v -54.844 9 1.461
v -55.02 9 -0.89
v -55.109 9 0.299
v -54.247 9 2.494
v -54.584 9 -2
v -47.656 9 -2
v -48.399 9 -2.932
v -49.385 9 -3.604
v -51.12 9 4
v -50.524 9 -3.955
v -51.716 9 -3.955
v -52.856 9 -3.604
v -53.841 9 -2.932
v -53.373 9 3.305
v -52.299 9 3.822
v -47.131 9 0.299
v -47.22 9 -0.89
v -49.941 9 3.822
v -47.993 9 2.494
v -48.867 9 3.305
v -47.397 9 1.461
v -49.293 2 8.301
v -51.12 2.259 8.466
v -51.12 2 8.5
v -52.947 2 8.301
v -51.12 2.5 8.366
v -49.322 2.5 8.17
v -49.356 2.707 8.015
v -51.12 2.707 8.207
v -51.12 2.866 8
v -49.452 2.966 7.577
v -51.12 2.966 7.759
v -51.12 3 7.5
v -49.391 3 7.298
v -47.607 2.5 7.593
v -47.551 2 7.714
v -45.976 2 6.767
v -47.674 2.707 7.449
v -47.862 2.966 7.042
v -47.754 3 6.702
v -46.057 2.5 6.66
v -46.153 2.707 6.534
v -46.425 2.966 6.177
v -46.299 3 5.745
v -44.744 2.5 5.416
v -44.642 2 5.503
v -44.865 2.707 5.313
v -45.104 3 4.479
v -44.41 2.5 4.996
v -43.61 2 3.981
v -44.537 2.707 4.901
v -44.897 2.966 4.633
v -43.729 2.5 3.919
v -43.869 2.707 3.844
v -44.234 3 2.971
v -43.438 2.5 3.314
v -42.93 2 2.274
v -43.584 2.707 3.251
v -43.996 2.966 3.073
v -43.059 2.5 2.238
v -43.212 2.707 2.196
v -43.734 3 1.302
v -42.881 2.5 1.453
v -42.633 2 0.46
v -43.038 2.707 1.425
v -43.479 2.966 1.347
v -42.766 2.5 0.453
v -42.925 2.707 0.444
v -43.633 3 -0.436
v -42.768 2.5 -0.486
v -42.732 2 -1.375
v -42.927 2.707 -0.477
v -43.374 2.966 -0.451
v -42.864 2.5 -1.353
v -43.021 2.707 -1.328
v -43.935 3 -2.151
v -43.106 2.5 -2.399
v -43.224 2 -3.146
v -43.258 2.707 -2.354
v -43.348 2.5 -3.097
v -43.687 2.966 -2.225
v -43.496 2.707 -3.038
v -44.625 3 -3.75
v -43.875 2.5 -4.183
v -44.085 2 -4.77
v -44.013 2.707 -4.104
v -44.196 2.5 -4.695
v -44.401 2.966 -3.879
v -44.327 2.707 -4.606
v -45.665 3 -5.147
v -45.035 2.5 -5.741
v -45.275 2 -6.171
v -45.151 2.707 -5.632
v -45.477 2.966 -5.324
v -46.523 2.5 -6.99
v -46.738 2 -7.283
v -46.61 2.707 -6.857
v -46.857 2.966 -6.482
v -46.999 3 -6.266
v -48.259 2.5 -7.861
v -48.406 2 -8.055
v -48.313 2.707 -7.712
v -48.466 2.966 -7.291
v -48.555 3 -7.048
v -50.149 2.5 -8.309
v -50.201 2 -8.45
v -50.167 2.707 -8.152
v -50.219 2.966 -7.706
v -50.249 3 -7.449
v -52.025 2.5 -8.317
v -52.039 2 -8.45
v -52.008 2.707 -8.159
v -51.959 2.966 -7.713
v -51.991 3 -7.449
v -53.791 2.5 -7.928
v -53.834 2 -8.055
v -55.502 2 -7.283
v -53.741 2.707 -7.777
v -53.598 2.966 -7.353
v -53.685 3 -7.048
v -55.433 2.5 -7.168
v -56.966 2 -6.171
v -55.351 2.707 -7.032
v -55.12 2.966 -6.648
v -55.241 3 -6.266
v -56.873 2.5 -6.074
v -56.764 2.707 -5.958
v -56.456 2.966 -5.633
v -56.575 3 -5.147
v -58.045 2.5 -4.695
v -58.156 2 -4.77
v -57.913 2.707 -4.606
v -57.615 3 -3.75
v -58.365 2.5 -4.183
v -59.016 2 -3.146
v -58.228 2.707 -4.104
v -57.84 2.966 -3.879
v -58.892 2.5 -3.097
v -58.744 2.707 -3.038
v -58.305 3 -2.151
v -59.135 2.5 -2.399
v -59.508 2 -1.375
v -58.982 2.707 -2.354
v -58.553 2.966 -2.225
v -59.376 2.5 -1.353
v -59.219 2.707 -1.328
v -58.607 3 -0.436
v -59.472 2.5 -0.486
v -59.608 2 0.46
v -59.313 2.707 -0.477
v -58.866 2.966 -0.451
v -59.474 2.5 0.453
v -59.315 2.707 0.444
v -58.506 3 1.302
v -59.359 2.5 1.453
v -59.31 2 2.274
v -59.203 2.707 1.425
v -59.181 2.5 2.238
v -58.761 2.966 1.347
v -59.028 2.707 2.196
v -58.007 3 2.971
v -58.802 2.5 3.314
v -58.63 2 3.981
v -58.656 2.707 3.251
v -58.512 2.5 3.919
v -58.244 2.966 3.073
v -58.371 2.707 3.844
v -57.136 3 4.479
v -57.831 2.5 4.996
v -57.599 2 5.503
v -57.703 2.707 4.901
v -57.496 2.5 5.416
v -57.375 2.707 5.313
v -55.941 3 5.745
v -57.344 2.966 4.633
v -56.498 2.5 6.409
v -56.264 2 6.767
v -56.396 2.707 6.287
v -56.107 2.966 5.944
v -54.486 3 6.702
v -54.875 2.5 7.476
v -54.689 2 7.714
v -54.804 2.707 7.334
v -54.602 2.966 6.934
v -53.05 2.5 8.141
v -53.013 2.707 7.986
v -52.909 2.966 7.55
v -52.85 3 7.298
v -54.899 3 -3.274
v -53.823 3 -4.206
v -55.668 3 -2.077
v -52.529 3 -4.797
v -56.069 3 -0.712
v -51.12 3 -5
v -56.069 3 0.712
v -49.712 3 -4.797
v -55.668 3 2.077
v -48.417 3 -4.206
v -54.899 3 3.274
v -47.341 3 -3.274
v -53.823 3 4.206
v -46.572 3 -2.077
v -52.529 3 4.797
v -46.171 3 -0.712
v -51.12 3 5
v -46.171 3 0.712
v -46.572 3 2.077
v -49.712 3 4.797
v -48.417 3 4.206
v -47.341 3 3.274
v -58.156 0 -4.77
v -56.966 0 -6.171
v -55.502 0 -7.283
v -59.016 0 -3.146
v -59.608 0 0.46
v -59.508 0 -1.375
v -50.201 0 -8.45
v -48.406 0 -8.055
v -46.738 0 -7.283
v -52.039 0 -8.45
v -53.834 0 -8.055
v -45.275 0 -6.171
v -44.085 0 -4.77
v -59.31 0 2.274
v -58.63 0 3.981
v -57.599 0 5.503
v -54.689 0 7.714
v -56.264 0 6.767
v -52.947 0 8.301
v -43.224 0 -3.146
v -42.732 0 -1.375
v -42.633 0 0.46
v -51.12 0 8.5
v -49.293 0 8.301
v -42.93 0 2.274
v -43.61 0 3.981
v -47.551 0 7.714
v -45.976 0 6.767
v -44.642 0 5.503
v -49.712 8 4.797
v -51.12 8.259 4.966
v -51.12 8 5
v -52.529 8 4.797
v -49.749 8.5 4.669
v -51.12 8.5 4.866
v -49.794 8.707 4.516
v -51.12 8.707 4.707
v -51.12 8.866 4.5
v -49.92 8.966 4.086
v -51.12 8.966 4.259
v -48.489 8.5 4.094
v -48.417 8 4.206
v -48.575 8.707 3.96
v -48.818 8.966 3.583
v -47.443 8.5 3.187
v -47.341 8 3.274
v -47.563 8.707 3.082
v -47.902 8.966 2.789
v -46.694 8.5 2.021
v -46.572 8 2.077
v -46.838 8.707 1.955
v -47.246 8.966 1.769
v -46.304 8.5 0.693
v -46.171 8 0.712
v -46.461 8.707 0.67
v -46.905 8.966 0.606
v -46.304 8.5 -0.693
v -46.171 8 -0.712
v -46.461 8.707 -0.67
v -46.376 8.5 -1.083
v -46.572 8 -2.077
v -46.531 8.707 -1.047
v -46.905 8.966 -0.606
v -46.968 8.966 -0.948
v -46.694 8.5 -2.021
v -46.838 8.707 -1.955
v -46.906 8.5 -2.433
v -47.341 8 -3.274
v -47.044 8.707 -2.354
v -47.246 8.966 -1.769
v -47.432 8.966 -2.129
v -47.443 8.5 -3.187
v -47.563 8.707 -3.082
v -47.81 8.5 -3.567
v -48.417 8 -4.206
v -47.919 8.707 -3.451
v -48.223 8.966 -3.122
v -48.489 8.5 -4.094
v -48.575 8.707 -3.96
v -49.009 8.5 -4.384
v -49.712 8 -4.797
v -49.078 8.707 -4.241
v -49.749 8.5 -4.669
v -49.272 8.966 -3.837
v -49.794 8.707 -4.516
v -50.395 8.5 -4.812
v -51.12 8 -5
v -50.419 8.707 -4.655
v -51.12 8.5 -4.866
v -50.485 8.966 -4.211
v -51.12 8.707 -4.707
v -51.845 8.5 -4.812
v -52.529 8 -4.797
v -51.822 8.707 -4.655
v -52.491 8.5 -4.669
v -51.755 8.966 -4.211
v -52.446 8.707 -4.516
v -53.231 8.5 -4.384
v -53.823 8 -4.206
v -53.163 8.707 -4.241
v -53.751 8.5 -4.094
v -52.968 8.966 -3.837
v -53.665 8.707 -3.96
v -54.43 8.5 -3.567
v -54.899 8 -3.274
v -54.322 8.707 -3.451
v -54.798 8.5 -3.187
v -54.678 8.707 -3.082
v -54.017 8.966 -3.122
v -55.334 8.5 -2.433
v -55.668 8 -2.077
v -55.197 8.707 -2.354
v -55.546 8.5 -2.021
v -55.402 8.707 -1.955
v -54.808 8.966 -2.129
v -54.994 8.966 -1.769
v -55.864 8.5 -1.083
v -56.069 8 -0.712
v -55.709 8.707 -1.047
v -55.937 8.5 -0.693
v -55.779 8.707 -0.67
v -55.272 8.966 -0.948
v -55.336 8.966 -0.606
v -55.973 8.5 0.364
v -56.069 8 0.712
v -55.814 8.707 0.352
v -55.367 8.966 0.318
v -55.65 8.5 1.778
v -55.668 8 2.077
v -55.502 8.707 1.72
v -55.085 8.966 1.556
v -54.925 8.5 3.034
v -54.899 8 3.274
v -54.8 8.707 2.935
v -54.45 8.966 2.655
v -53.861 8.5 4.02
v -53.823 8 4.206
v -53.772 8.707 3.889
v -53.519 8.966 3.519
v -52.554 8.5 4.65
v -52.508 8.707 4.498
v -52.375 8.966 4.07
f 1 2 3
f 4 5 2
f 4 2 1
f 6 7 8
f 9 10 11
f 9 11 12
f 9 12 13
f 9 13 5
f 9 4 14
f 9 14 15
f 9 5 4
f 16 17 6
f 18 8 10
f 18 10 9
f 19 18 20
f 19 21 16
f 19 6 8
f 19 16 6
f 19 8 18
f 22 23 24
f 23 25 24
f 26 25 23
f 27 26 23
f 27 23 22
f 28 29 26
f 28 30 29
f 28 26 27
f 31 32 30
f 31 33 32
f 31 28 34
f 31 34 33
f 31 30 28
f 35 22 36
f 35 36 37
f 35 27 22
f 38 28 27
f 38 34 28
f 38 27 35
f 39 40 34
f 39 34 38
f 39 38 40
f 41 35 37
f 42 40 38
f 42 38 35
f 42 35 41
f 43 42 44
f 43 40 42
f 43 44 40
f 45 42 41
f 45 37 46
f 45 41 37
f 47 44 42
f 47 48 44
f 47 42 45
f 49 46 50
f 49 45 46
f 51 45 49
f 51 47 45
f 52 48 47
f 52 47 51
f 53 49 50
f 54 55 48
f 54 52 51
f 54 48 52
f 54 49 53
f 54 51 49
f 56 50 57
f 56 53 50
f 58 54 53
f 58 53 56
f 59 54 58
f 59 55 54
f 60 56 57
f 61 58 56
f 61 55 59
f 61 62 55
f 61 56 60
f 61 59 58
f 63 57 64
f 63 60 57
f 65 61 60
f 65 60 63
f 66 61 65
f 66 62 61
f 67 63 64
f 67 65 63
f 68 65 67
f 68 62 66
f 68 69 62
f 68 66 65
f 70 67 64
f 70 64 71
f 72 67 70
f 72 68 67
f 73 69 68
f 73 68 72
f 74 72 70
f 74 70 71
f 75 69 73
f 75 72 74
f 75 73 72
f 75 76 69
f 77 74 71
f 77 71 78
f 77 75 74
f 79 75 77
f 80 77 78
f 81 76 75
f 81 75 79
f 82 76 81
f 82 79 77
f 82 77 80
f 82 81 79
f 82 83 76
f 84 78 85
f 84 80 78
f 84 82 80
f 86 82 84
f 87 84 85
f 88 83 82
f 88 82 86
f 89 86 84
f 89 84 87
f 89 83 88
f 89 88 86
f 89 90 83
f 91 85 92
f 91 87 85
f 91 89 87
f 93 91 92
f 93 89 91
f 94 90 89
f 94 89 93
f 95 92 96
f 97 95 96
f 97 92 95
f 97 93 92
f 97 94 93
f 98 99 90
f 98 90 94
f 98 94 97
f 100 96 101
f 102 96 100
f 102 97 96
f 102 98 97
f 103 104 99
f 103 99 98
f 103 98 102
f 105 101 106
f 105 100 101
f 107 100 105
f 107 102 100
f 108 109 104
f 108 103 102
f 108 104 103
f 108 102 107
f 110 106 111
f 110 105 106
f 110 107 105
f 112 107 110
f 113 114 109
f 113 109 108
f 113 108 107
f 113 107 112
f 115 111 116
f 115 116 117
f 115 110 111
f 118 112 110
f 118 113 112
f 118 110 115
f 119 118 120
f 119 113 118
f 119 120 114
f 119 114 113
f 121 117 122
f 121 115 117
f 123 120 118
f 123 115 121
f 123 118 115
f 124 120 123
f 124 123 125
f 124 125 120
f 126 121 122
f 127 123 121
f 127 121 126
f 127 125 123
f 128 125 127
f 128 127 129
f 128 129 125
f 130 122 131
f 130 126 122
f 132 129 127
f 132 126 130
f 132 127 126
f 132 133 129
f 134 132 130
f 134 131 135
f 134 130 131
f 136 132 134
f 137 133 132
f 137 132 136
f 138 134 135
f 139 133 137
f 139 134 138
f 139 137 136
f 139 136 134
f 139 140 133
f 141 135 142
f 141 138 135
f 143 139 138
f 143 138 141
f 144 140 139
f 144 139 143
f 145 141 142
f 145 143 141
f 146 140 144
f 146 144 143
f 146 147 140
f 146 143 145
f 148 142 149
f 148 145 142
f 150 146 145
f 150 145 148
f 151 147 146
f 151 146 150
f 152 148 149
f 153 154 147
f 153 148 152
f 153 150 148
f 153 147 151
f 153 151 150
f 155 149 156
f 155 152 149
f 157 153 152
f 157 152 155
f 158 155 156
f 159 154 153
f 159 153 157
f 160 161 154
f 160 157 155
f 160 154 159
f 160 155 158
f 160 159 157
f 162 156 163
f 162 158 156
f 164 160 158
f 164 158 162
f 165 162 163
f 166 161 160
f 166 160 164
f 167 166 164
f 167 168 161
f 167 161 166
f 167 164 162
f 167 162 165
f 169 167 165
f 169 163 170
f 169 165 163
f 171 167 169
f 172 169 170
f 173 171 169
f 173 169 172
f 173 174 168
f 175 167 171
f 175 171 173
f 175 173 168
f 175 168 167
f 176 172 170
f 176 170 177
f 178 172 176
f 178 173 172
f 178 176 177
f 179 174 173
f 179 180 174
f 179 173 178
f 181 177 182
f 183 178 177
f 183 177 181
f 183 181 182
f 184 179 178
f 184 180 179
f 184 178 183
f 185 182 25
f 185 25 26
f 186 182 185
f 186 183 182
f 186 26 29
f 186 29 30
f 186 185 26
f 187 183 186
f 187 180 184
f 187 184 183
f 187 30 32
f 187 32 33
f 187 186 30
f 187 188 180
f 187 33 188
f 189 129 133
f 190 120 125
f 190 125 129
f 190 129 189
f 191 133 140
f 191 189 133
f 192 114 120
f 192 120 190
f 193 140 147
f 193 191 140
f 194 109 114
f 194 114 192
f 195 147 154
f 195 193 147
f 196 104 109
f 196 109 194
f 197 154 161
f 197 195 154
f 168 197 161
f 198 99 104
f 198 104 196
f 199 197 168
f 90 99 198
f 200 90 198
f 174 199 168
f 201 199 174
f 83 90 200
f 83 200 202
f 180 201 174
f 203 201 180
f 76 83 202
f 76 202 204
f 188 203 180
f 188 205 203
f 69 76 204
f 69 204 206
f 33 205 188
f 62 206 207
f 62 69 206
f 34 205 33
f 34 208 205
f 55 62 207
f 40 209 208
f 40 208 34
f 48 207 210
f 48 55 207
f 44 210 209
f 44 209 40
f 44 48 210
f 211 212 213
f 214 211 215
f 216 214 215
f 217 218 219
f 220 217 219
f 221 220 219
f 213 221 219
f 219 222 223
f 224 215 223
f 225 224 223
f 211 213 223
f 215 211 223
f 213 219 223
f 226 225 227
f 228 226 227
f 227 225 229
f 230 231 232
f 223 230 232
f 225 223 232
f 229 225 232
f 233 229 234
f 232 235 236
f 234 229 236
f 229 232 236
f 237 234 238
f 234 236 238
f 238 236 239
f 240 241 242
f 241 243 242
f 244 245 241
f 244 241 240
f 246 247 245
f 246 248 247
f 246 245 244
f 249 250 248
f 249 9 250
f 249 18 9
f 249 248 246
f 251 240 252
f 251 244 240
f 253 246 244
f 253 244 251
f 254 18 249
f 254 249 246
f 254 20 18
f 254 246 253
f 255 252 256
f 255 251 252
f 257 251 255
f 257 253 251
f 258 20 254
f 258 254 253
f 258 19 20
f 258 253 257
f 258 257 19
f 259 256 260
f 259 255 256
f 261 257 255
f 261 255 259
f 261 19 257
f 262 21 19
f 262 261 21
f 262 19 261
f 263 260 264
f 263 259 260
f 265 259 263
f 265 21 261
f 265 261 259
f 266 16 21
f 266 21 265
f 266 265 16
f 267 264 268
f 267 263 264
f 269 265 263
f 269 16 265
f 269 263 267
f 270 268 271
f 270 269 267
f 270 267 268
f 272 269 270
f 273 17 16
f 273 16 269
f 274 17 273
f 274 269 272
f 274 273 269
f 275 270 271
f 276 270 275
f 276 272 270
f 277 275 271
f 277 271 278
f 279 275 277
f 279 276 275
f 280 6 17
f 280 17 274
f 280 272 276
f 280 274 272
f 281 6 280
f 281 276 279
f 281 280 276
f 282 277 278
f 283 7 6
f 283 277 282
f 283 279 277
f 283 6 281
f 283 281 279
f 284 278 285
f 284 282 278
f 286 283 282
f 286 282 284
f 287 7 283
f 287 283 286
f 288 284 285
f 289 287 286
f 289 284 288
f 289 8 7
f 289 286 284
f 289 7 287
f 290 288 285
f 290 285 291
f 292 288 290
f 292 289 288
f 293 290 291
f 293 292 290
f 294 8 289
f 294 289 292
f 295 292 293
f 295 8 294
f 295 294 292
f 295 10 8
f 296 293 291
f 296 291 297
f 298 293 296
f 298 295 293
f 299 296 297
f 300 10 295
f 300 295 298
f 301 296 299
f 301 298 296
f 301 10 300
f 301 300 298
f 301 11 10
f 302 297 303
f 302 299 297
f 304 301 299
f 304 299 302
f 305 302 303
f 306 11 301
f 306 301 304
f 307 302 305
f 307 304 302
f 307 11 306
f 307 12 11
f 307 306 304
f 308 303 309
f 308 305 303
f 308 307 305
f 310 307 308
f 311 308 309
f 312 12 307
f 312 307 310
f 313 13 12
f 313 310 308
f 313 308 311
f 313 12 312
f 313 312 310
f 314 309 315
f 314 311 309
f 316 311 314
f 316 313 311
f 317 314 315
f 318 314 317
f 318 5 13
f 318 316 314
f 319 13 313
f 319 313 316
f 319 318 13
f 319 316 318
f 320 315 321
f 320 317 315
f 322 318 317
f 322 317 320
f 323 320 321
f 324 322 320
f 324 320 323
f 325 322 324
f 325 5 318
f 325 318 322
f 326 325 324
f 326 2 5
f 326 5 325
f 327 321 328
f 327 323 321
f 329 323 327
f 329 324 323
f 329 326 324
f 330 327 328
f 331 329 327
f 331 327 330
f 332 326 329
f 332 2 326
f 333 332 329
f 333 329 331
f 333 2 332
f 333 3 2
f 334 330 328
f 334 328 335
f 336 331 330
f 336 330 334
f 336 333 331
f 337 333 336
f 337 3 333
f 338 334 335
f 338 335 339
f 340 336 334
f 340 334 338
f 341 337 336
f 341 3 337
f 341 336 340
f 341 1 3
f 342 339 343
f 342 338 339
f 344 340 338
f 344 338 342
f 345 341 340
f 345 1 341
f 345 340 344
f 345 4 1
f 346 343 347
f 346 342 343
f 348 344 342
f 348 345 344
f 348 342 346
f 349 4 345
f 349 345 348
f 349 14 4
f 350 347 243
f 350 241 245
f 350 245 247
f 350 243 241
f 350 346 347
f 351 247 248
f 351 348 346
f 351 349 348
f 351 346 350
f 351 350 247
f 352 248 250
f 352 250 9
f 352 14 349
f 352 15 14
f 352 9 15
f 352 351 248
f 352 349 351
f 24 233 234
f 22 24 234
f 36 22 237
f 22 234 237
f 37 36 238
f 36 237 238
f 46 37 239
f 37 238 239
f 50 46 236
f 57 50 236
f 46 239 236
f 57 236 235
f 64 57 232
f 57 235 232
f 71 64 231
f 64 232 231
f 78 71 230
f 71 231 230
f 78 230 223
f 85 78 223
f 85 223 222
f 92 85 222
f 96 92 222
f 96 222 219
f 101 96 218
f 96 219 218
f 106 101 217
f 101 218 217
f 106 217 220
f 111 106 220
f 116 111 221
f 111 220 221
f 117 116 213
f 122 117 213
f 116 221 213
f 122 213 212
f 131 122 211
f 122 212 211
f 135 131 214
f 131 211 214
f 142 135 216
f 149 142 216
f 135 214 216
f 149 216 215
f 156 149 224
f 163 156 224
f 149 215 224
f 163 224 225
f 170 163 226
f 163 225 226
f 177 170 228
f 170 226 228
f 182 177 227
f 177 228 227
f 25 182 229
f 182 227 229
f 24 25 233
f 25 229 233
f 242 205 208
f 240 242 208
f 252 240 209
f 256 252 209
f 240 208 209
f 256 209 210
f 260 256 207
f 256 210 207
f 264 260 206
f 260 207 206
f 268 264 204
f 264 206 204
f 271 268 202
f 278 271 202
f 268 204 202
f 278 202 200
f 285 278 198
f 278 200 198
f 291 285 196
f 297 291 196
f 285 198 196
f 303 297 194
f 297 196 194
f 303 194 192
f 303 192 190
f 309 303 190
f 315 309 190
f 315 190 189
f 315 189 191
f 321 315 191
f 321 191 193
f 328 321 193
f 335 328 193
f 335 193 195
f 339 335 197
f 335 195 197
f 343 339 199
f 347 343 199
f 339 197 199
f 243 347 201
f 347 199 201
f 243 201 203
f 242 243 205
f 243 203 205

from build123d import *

# Parameters (mm, degrees)
SKETCH1_R           = 8.5
BOSS_EXTRUDE1_DEPTH = 3
FILLET2_R           = 1
SKETCH2_R           = 5
BOSS_EXTRUDE3_DEPTH = 6
FILLET4_R           = 1


with BuildPart() as part:
    # Sketch1 → Boss-Extrude1 (new body)
    with BuildSketch(Plane(origin=(0, 0, 0), x_dir=(1, 0, 0), z_dir=(0, 1, 0))):
        with Locations(Location((-51.120170416, 0, 0), (0, 0, 270))):
            Circle(SKETCH1_R)
    extrude(amount=BOSS_EXTRUDE1_DEPTH)

    # Fillet2
    fillet2_edges = [part.edges().sort_by_distance(p)[0] for p in [
        (-51.120170416, 3, -8.5),
    ]]
    fillet(fillet2_edges, radius=FILLET2_R)

    # Sketch2 → Boss-Extrude3 (add)
    with BuildSketch(Plane(origin=(0, 3, 0), x_dir=(1, 0, 0), z_dir=(0, 1, 0))):
        with Locations(Location((-51.120170416, 0, 0), (0, 0, 270))):
            Circle(SKETCH2_R)
    extrude(amount=BOSS_EXTRUDE3_DEPTH)

    # Fillet4
    fillet4_edges = [part.edges().sort_by_distance(p)[0] for p in [
        (-51.120170416, 9, -5),
    ]]
    fillet(fillet4_edges, radius=FILLET4_R)


solid = part.part
